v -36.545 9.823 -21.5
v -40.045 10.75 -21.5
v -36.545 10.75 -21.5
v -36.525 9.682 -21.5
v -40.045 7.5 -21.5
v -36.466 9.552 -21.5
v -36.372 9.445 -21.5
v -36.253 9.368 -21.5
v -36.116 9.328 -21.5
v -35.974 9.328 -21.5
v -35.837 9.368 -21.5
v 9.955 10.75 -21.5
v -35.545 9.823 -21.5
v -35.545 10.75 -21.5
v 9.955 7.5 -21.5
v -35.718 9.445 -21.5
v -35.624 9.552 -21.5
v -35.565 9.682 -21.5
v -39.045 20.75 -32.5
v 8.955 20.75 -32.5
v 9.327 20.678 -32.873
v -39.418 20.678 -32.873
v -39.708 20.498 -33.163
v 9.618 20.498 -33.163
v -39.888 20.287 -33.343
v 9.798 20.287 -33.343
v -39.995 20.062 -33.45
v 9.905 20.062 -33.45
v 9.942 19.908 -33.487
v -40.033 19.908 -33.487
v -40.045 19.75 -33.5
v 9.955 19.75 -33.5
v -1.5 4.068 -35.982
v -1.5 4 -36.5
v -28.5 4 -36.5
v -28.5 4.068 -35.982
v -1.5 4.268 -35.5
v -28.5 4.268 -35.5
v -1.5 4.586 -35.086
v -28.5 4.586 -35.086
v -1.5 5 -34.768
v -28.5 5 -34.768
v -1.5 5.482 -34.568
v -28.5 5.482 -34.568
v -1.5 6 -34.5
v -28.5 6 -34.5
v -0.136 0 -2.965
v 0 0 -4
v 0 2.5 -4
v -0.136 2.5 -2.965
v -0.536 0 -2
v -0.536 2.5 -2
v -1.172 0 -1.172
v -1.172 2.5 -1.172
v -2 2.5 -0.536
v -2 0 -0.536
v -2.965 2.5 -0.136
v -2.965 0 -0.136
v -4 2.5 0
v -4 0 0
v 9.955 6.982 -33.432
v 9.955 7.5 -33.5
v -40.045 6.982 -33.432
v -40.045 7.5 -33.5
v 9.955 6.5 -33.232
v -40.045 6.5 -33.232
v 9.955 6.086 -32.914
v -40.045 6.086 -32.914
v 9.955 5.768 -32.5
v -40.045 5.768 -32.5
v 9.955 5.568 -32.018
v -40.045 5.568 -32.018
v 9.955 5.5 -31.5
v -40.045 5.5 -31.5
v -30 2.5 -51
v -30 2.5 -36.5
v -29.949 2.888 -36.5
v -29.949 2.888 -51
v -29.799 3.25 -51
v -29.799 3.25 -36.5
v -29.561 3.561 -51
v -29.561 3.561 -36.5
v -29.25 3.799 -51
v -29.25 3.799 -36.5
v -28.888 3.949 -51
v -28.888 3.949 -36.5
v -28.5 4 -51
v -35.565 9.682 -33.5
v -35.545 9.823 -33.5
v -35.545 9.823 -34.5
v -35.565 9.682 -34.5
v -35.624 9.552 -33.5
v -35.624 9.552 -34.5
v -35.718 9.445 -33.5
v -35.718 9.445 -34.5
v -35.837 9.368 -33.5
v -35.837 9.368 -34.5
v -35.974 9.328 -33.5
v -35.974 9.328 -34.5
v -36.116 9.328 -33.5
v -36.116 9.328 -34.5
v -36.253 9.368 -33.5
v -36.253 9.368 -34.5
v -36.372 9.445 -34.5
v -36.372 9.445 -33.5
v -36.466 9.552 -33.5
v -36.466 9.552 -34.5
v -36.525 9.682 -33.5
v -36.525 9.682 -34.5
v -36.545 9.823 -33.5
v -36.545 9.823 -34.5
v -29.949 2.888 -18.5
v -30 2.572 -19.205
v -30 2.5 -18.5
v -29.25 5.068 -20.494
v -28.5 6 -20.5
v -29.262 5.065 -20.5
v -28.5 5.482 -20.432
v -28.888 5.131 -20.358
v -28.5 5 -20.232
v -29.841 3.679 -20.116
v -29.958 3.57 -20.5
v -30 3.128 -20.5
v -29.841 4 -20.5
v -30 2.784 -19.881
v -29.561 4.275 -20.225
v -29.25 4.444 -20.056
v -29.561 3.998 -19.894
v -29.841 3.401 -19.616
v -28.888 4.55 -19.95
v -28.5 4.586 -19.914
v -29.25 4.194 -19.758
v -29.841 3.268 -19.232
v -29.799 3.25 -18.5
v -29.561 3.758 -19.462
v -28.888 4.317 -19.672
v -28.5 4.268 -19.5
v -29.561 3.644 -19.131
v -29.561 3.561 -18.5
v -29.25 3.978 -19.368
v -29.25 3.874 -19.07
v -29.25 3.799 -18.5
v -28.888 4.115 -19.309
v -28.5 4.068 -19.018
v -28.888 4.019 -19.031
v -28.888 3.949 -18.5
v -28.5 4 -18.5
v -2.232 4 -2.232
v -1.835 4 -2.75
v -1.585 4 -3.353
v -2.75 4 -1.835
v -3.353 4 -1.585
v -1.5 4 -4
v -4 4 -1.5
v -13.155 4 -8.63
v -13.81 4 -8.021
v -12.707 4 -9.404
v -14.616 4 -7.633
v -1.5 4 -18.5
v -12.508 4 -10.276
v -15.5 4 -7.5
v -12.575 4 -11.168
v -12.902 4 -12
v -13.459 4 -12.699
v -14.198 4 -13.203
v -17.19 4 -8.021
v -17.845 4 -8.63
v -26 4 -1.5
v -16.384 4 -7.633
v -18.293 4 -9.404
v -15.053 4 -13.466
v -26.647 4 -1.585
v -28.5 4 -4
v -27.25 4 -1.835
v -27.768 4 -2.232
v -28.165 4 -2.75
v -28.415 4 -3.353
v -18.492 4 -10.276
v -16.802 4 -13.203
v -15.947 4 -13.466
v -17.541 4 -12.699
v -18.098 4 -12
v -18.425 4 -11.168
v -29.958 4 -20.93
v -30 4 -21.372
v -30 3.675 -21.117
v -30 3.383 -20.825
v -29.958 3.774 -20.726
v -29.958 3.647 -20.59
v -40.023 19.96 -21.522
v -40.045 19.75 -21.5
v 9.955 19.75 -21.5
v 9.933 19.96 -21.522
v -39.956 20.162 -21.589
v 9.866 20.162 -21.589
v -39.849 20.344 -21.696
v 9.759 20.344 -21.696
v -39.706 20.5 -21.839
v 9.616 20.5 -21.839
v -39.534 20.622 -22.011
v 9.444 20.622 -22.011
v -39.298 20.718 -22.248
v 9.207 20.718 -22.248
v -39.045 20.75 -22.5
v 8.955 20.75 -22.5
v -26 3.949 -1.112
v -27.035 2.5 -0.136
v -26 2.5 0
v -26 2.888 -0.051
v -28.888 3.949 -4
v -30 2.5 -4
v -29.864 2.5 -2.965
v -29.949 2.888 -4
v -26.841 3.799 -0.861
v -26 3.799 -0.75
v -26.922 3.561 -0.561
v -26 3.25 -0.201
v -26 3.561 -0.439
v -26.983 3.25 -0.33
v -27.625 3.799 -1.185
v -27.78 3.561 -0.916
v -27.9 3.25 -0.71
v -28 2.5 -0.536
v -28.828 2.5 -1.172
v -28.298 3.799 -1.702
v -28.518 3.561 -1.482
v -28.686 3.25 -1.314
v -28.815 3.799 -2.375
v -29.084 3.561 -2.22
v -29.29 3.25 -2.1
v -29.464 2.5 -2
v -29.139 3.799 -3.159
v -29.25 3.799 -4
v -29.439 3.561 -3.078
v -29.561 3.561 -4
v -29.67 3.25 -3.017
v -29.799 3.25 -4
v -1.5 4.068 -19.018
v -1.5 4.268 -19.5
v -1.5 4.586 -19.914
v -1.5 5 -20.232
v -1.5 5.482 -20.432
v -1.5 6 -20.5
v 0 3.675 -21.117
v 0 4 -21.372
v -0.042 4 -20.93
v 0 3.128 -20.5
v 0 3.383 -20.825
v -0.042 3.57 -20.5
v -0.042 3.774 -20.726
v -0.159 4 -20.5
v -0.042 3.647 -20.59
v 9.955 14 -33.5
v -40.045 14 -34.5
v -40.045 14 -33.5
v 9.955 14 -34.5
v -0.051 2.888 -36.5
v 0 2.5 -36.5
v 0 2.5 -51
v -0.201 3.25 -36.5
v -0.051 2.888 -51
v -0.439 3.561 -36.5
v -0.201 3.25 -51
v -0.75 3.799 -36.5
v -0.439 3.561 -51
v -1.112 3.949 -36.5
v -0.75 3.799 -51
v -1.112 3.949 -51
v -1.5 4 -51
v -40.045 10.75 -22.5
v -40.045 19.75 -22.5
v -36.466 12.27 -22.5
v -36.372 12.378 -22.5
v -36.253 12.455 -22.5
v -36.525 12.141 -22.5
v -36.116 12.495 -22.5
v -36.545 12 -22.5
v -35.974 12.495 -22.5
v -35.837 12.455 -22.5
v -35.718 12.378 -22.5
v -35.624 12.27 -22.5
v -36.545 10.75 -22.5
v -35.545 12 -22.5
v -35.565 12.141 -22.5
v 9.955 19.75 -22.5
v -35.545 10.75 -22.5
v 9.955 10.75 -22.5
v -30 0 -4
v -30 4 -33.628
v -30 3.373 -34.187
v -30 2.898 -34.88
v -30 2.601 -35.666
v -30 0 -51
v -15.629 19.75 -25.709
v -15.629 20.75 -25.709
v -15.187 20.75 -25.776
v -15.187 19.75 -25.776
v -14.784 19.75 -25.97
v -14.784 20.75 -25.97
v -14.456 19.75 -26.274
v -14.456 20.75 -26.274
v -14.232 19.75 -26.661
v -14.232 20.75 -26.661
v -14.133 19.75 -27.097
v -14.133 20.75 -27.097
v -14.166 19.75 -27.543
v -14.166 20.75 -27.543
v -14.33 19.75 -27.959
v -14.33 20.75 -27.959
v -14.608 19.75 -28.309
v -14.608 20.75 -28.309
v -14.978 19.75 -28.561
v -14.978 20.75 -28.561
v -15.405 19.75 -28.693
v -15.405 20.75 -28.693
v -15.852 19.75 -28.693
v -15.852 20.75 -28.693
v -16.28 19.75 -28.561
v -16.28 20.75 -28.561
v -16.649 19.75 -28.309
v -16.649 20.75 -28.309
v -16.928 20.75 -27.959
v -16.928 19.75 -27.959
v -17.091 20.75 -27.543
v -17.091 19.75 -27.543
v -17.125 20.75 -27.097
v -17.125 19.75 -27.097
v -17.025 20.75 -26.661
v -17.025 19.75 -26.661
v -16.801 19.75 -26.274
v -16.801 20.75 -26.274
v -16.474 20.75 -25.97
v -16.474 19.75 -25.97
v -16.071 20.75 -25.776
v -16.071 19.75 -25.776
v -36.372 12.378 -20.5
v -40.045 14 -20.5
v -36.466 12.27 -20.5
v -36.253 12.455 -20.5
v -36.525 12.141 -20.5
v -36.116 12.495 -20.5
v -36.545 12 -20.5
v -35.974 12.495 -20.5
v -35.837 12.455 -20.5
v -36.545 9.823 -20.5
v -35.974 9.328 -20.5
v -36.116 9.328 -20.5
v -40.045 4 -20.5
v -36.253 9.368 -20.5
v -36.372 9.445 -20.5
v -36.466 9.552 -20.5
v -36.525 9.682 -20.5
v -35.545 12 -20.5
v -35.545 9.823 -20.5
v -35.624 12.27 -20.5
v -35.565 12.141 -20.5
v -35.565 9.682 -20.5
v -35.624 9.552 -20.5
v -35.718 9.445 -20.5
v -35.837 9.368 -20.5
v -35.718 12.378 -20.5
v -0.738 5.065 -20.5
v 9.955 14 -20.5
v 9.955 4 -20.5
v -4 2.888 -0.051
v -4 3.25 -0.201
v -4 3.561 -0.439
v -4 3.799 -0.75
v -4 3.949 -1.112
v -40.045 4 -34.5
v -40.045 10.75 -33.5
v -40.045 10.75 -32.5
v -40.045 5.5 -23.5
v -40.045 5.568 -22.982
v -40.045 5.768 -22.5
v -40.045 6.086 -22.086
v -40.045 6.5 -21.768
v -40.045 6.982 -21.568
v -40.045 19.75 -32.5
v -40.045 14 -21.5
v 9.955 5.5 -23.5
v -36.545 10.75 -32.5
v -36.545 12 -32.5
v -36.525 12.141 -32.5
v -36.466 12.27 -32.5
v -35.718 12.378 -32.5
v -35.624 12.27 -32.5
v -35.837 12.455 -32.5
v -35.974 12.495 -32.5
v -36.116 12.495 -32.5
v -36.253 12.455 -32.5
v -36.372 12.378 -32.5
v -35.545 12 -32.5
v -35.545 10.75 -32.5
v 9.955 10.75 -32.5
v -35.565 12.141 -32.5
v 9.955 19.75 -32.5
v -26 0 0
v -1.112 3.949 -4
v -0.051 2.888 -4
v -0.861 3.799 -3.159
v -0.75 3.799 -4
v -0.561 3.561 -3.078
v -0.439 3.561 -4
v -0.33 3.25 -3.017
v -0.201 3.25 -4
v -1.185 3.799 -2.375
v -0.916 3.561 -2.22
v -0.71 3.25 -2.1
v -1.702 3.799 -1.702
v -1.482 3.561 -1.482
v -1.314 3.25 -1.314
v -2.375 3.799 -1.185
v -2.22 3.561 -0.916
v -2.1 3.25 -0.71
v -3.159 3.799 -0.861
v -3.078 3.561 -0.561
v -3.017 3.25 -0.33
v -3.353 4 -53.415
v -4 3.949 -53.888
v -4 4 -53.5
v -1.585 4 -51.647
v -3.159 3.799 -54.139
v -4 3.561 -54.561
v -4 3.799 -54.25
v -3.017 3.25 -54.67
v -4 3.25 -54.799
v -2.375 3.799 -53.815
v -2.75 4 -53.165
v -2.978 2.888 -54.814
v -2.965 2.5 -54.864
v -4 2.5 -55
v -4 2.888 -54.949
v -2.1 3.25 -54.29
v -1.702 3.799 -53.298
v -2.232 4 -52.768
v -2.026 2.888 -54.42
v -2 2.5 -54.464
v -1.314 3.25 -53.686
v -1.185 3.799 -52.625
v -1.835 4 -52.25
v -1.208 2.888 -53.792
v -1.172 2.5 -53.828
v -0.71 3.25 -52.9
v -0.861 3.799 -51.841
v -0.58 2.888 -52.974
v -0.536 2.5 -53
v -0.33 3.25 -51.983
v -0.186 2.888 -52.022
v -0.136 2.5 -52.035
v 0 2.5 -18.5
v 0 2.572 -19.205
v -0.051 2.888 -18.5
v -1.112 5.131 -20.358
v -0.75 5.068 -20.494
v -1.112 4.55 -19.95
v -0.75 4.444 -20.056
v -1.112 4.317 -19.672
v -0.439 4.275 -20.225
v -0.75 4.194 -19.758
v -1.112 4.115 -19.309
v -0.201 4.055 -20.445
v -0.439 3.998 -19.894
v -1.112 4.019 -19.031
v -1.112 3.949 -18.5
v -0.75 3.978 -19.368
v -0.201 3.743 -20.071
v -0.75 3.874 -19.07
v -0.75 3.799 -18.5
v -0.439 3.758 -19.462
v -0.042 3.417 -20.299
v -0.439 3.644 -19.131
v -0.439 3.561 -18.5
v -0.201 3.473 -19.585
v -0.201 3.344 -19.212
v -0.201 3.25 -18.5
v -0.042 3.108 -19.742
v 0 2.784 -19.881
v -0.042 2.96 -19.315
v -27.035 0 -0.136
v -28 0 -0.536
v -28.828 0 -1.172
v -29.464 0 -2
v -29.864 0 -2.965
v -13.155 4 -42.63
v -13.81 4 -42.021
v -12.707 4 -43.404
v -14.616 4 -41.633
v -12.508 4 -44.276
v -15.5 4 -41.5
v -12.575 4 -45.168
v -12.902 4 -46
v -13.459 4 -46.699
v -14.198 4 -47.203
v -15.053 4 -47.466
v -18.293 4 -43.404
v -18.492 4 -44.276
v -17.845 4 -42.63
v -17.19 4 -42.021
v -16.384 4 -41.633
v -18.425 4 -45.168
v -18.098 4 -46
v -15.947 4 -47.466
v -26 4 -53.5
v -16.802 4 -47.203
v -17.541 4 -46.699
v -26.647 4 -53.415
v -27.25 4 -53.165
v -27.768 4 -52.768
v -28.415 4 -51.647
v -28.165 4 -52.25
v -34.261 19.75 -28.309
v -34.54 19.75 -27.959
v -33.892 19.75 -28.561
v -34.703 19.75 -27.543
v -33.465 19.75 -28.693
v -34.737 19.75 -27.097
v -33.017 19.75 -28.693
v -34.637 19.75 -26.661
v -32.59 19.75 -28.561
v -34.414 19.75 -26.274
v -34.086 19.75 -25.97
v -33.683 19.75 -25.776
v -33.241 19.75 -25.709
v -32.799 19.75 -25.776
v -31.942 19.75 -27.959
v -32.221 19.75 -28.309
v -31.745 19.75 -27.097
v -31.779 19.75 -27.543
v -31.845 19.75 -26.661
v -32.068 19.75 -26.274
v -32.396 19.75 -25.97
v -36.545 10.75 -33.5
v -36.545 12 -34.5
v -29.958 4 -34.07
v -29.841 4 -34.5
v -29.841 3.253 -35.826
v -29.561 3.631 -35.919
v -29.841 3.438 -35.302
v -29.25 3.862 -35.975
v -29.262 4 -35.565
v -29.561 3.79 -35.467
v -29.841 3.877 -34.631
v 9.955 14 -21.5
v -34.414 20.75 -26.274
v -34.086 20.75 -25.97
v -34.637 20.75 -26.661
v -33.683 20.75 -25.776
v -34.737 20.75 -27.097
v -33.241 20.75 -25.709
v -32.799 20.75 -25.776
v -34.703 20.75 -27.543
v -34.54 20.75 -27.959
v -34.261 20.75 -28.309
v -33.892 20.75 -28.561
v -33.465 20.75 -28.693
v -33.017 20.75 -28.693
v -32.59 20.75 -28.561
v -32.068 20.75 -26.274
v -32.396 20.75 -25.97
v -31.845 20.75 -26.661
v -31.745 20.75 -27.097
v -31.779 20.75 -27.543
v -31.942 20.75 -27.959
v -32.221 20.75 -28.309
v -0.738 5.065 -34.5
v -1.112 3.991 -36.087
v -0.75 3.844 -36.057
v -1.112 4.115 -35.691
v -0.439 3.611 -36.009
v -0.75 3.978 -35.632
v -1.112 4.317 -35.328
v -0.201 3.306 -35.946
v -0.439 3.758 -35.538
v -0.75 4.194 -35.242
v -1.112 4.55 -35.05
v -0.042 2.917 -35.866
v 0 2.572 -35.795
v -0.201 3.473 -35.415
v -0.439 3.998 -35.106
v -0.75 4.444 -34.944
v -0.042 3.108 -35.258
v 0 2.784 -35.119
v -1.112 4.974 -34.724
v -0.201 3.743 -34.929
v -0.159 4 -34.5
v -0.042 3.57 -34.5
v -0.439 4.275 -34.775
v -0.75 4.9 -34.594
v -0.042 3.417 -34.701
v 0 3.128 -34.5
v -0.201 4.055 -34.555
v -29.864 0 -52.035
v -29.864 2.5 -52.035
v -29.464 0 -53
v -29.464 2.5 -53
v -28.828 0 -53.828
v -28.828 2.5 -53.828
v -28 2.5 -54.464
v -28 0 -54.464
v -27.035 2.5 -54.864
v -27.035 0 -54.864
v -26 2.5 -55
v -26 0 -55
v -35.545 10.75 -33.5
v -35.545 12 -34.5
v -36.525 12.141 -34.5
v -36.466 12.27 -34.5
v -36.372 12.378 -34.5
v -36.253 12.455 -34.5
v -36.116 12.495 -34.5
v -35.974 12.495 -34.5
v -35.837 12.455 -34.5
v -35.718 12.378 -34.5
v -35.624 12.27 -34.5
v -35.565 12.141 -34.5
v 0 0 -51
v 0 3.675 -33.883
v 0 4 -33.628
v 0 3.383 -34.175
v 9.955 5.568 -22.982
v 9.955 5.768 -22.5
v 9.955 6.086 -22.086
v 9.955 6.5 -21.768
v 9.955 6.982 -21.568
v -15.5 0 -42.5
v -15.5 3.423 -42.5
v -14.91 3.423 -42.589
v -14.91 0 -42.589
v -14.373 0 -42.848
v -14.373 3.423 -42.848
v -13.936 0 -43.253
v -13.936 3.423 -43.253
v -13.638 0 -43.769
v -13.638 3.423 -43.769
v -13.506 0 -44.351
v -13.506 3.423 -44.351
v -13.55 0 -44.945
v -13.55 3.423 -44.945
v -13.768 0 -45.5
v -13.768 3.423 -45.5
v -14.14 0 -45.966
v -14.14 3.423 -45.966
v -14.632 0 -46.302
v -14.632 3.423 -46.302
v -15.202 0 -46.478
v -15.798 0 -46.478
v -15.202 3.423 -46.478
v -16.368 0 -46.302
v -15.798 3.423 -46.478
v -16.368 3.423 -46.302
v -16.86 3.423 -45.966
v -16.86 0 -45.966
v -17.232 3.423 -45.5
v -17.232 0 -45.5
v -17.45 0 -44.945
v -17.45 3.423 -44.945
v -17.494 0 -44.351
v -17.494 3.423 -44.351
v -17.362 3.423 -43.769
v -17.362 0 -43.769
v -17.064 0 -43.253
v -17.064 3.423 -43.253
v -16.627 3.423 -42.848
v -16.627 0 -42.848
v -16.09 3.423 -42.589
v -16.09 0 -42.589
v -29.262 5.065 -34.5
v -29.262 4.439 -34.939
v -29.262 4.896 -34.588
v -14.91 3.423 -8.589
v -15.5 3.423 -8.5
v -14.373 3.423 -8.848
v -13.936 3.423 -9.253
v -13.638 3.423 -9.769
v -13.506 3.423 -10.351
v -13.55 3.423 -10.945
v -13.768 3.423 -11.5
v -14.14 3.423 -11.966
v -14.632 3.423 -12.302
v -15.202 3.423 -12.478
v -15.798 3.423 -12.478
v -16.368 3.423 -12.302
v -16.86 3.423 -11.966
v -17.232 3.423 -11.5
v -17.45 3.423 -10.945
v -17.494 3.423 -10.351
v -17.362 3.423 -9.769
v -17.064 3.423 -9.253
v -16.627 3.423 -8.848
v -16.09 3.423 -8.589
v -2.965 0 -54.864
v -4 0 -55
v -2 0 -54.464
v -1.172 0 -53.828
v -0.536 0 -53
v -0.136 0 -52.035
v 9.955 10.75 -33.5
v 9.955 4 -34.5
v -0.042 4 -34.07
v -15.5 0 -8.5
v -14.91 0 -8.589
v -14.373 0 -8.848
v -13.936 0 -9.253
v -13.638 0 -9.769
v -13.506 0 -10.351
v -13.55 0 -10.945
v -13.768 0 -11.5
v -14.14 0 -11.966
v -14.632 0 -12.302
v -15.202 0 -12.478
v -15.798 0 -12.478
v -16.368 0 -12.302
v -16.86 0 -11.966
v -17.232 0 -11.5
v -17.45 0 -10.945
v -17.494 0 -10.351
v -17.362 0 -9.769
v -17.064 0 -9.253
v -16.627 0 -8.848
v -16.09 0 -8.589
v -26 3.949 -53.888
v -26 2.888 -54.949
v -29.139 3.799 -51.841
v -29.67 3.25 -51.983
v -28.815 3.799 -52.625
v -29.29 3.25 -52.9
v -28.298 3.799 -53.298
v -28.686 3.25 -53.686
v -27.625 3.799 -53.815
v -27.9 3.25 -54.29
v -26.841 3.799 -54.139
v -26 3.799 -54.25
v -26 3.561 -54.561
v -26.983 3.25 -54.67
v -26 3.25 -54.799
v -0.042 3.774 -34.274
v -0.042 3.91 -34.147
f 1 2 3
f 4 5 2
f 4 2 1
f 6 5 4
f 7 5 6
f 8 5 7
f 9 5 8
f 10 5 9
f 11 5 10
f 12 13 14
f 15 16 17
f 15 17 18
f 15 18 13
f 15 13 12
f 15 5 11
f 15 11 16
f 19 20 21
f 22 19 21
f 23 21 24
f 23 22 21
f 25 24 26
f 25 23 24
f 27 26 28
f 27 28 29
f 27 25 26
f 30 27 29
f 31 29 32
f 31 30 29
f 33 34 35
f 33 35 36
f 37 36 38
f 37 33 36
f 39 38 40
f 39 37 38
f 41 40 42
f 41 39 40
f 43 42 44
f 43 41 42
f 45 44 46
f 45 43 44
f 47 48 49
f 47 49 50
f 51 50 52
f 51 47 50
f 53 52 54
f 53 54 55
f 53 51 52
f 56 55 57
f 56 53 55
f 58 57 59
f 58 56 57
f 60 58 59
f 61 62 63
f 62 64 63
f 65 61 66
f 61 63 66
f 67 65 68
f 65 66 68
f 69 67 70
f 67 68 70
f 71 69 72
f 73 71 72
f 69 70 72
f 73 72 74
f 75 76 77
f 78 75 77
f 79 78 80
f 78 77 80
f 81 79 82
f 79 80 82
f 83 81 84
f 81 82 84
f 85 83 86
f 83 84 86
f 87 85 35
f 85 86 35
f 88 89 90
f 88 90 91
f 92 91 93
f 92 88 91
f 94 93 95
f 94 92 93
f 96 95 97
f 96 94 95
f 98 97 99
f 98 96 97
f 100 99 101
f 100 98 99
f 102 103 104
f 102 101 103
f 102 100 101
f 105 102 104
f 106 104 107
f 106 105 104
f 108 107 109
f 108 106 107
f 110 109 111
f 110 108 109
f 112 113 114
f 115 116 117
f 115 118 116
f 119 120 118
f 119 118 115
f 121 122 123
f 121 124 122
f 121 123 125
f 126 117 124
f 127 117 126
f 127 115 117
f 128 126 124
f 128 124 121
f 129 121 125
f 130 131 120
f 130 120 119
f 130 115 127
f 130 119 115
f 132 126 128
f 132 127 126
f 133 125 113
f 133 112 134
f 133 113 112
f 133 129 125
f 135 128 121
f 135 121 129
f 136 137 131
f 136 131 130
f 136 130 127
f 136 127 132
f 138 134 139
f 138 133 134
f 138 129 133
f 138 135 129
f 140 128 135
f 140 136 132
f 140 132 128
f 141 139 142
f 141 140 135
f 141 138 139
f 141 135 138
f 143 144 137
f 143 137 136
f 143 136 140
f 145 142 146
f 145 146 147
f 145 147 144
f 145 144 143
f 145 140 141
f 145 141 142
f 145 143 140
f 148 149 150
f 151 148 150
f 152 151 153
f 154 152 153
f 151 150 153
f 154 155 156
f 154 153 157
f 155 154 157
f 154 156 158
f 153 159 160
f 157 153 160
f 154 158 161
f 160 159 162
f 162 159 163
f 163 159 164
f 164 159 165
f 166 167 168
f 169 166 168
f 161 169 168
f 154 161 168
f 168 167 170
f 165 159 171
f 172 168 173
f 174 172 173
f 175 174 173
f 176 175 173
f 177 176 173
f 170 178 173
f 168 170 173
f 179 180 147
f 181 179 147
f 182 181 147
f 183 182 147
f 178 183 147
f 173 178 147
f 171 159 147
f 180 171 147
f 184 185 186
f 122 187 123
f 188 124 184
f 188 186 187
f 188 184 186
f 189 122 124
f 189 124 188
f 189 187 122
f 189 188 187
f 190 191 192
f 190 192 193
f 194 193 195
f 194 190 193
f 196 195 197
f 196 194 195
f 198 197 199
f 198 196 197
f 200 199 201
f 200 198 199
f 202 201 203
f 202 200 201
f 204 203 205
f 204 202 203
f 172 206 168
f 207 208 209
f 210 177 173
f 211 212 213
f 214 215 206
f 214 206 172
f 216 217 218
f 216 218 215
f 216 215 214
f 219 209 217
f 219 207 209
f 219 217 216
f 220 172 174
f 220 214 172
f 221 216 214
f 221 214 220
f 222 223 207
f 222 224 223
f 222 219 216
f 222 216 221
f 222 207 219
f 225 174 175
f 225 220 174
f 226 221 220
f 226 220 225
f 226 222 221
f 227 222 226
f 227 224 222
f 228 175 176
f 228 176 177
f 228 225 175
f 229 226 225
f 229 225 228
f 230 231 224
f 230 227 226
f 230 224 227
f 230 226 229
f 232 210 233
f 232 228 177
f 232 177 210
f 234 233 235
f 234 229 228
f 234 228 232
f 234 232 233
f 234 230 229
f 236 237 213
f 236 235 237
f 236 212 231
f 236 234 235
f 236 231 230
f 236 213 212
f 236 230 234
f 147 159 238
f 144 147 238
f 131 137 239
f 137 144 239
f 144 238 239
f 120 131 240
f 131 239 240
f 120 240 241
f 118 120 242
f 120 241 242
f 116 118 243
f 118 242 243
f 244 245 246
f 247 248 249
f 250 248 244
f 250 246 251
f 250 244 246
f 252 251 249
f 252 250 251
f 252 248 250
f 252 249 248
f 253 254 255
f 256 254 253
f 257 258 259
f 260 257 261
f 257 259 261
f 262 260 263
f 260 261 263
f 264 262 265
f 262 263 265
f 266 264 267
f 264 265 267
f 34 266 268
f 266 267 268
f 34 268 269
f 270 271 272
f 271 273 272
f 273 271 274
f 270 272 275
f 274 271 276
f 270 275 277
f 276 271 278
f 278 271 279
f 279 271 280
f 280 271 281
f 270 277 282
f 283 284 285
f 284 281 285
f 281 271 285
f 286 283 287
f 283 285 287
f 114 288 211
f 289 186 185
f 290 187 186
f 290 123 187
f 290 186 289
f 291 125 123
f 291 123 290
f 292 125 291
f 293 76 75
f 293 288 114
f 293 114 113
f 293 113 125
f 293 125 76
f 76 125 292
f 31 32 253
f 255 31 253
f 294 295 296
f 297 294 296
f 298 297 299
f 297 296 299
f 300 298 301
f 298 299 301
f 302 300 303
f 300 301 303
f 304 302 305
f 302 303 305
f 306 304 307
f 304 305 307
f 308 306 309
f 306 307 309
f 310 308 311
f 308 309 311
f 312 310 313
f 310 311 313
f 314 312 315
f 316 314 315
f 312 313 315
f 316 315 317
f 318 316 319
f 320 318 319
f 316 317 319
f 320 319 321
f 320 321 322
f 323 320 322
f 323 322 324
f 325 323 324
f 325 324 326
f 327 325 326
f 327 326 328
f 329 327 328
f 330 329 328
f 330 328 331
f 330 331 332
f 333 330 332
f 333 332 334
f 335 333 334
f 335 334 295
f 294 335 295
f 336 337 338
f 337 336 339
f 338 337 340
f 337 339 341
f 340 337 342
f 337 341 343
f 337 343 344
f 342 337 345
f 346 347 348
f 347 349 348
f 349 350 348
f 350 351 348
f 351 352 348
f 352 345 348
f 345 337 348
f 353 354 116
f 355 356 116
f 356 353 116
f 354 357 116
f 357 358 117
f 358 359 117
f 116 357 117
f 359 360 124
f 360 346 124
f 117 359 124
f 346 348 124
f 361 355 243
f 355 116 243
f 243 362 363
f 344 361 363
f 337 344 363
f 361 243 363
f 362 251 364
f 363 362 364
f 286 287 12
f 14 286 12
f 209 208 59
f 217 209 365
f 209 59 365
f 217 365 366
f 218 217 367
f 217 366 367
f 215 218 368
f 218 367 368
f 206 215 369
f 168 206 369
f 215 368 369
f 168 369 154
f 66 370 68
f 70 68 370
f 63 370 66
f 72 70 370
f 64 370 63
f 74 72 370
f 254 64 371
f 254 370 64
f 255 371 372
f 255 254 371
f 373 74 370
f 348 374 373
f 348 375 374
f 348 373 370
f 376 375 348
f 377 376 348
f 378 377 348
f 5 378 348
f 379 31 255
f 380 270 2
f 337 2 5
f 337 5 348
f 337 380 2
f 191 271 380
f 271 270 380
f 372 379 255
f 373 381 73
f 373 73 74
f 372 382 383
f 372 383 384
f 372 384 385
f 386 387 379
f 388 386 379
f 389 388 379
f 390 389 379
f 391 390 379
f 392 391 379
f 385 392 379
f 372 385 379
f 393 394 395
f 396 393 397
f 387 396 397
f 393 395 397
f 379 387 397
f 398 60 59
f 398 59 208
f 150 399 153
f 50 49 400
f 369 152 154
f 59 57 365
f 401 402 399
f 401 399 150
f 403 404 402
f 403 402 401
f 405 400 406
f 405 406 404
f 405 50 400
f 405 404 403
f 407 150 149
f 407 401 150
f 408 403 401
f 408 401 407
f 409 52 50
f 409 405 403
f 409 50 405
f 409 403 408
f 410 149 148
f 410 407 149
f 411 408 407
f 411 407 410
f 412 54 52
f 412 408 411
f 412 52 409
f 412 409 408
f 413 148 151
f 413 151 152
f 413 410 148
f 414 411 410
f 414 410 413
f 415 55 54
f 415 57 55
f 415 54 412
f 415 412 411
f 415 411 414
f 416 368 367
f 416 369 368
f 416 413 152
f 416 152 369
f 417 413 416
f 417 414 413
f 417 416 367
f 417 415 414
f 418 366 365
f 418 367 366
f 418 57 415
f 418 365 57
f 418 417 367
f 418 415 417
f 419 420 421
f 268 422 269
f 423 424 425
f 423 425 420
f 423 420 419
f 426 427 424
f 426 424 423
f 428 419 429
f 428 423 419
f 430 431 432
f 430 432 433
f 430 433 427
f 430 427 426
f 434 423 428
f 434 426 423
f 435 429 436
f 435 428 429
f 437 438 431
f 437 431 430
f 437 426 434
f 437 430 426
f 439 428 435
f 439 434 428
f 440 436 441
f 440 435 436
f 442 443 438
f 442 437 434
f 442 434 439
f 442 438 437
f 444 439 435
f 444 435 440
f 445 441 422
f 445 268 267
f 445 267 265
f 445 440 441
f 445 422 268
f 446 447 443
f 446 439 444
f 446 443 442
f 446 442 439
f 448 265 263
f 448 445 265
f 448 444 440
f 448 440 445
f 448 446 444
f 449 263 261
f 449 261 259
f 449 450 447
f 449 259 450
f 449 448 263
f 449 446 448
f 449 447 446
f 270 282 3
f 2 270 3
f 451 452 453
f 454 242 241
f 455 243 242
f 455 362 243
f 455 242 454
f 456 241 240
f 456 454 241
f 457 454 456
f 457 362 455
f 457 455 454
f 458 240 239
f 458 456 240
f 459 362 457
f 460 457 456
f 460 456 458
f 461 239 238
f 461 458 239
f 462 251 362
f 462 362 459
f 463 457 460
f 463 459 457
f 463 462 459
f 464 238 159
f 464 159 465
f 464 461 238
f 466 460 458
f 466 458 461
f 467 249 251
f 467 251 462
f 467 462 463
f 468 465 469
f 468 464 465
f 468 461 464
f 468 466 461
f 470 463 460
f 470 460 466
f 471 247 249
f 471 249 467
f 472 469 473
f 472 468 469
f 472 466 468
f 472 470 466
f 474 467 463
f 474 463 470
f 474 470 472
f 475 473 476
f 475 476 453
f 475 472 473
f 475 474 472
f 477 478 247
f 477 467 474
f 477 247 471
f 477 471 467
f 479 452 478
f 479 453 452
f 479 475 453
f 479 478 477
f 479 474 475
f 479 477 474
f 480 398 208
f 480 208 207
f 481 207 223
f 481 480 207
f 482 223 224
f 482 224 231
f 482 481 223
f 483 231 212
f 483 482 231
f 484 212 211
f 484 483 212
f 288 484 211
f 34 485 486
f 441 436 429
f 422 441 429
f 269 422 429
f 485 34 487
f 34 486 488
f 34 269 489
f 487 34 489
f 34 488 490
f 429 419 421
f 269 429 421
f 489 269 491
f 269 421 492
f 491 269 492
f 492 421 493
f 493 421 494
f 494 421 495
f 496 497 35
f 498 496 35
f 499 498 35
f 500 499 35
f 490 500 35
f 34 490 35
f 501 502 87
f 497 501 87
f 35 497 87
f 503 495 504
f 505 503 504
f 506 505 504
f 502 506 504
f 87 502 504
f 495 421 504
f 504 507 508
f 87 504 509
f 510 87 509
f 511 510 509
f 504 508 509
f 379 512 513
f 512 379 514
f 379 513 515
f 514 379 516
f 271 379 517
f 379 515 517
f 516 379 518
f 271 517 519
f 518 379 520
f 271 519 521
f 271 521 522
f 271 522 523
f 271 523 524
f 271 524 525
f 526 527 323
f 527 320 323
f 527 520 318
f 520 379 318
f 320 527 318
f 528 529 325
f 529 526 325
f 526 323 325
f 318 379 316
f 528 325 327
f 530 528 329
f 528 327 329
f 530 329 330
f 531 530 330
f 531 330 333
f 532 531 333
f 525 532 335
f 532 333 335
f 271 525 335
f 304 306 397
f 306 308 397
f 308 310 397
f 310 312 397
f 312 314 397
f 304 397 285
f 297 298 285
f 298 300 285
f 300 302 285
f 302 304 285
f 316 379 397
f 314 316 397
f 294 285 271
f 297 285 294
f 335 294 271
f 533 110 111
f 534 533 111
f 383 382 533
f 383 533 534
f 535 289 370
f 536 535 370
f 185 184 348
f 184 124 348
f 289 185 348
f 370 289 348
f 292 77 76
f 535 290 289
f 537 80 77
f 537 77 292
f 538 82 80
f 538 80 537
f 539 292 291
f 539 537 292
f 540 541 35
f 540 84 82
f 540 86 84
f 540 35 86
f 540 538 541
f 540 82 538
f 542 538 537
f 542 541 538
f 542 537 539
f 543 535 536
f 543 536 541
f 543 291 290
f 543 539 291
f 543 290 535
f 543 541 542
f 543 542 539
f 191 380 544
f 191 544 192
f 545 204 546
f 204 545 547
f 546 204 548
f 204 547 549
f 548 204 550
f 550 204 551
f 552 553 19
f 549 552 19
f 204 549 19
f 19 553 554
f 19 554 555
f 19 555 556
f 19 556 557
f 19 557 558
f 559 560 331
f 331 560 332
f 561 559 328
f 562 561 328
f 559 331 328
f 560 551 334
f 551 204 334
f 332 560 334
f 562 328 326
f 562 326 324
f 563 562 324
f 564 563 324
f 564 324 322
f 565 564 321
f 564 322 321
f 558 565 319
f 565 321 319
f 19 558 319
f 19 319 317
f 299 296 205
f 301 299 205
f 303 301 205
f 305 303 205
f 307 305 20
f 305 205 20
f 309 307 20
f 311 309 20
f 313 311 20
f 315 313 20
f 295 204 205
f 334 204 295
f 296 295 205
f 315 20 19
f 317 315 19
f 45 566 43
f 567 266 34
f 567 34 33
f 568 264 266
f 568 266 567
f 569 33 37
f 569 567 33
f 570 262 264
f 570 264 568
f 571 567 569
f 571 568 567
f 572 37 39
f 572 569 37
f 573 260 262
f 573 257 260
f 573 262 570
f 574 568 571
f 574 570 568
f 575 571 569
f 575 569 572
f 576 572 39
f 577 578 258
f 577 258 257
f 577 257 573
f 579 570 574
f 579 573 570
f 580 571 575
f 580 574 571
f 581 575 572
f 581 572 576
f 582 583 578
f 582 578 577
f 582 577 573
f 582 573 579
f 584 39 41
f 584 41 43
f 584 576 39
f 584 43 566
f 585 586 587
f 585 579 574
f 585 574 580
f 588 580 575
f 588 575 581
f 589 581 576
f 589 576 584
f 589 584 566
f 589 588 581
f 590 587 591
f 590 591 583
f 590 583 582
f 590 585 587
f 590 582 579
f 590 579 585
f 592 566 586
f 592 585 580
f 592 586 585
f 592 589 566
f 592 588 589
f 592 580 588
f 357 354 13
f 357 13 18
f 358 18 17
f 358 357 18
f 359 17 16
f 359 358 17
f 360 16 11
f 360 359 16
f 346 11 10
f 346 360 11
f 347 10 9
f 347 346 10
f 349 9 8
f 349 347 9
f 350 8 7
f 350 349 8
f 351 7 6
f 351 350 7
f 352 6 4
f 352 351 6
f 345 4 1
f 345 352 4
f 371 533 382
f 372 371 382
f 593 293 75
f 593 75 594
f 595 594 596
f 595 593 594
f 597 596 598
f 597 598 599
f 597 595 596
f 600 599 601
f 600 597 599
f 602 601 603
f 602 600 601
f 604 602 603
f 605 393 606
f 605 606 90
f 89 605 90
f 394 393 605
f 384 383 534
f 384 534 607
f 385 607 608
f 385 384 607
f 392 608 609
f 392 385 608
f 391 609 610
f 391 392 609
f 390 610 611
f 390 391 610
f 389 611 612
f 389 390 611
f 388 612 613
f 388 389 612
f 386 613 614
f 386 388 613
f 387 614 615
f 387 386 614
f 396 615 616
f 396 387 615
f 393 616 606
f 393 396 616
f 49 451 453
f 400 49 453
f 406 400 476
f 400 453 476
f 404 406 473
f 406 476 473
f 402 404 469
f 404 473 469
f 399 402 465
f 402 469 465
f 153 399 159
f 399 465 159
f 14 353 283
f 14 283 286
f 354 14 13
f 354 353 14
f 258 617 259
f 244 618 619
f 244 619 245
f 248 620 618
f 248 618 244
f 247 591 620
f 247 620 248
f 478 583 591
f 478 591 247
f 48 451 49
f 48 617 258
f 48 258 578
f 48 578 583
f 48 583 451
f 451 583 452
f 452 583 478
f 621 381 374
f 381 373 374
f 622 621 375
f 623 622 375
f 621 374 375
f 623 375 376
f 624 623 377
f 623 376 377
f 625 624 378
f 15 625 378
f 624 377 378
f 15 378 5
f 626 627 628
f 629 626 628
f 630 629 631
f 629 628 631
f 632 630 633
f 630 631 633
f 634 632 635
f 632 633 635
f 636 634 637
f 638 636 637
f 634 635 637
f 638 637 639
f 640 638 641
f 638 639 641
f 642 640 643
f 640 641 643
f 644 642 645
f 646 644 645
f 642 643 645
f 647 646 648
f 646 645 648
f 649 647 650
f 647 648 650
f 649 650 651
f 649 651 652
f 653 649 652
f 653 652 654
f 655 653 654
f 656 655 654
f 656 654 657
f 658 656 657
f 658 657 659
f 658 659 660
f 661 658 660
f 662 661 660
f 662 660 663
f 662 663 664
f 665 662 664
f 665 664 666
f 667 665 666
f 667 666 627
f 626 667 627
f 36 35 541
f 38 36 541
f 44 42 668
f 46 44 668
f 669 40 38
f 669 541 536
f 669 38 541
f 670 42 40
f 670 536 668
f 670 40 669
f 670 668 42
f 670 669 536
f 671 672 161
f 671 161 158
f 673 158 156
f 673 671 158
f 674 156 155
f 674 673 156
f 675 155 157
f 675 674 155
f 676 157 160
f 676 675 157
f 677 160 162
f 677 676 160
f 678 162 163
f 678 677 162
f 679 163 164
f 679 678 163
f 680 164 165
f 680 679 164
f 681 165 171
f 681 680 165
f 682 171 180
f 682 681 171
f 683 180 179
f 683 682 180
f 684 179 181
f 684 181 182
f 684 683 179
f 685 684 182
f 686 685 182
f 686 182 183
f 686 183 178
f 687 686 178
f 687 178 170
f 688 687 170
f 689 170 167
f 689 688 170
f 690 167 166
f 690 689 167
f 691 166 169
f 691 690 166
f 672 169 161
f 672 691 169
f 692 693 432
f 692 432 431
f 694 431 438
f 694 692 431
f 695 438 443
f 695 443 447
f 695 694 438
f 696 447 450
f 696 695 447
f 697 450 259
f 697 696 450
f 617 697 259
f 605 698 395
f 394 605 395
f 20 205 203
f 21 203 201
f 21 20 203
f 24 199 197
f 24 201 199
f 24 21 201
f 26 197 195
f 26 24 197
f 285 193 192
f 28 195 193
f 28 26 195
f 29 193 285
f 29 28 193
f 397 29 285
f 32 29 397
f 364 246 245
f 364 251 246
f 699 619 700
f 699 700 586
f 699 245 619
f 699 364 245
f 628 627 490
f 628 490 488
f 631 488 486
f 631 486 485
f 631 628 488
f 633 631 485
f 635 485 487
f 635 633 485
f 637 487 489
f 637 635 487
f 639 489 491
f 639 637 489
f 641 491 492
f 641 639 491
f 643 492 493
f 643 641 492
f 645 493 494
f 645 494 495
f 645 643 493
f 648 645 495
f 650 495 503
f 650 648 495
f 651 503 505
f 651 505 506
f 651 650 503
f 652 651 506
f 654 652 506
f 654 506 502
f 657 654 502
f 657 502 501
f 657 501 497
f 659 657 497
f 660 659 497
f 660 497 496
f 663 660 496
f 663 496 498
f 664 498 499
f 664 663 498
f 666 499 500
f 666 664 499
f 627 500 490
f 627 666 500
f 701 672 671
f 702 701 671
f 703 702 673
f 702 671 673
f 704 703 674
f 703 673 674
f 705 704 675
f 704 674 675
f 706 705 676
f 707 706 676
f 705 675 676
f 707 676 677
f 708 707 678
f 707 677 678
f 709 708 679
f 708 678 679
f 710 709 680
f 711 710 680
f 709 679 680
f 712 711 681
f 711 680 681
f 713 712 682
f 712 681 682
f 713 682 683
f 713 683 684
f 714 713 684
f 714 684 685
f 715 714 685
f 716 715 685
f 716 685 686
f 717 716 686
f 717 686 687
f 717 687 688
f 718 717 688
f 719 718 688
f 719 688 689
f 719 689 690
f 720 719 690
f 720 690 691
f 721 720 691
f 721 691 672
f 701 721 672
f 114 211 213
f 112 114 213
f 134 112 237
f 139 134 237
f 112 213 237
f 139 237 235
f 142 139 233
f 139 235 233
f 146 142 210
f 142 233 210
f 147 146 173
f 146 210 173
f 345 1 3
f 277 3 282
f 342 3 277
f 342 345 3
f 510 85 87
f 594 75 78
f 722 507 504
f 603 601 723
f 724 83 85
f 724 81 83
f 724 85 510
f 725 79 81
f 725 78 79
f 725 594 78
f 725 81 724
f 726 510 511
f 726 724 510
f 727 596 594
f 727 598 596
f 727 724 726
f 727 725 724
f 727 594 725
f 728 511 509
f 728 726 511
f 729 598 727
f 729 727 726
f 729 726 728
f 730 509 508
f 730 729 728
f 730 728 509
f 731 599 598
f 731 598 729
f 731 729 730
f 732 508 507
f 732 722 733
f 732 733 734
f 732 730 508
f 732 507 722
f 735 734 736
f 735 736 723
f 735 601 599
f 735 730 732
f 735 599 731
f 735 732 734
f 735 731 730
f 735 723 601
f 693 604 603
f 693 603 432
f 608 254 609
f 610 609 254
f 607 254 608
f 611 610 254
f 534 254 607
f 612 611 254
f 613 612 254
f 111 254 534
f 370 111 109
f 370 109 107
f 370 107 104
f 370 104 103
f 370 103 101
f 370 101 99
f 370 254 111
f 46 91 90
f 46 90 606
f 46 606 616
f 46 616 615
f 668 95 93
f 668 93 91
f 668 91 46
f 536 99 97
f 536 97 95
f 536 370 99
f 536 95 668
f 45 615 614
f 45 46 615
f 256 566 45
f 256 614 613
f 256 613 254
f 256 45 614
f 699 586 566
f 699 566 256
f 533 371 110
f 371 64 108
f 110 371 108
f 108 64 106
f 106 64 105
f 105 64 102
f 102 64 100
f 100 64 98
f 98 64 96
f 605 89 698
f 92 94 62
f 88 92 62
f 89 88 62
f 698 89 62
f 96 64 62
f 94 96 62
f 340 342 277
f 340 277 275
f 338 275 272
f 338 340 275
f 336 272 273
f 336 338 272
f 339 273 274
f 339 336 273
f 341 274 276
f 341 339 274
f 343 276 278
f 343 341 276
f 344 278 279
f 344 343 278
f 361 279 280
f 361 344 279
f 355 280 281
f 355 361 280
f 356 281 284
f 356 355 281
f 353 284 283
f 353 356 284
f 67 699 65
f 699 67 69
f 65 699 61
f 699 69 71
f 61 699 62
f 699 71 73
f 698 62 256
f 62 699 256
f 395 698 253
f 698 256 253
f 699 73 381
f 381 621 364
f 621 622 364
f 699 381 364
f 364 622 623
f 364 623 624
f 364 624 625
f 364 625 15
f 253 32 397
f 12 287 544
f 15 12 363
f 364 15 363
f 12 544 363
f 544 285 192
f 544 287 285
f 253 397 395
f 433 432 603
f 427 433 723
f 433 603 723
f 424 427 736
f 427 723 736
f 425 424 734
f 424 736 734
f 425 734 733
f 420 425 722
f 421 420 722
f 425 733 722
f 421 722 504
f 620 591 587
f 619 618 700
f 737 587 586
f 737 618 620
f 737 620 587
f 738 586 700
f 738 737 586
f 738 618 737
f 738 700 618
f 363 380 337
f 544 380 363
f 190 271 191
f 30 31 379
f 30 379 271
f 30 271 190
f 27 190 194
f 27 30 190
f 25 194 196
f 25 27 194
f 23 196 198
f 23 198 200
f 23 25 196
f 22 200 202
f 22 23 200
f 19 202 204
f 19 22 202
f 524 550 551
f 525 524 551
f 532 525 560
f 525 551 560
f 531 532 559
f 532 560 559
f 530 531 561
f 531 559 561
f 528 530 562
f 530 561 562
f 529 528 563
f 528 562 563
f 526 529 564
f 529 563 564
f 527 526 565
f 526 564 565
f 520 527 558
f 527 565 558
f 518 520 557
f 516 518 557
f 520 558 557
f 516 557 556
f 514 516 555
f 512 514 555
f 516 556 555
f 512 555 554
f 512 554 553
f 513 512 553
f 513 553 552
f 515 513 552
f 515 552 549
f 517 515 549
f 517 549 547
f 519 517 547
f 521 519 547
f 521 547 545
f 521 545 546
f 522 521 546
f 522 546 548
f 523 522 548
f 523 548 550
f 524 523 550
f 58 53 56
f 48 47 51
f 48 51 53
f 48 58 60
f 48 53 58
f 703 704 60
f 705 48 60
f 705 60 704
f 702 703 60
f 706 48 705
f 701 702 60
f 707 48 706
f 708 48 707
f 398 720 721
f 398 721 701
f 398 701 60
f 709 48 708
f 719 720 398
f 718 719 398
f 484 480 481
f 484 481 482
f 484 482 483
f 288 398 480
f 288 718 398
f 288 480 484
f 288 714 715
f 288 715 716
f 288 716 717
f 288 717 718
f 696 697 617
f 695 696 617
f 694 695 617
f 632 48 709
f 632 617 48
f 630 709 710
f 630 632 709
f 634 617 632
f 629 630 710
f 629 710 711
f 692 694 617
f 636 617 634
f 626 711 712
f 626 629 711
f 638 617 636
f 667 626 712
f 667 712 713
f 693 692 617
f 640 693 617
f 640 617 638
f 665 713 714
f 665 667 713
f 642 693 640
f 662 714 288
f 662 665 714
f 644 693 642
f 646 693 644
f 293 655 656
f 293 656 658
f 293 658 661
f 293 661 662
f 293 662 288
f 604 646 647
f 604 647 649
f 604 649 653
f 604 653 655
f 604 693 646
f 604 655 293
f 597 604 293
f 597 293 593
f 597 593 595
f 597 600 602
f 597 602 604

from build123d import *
from OCP.BRepFilletAPI import BRepFilletAPI_MakeChamfer

# Parameters (mm, degrees)
BOSS_EXTRUDE1_DEPTH = 4
SKETCH3_W           = 50
SKETCH3_H           = 1
BOSS_EXTRUDE2_DEPTH = 10
BOSS_EXTRUDE3_START = -13
SKETCH4_W           = 50
SKETCH4_H           = 1.5
BOSS_EXTRUDE3_DEPTH = 12
FILLET1_R           = 2
FILLET2_R           = 2
FILLET3_R           = 2
FILLET4_R           = 1.5
BOSS_EXTRUDE4_DEPTH = 50
FILLET6_START       = -40.045040573
FILLET6_DEPTH       = 50
FILLET6_START_2     = -34.5
FILLET6_2_DEPTH     = 14
SKETCH6_R           = 1.5
CUT_EXTRUDE1_DEPTH  = 2
SKETCH8_R           = 2
CUT_EXTRUDE2_DEPTH  = 10
CHAMFER1_SIZE       = 1
CHAMFER1_SIZE2      = 0.577350269
CUT_EXTRUDE3_DEPTH  = 57.783957087


with BuildPart() as part:
    # Sketch1 → Boss-Extrude1 (new body)
    with BuildSketch(Plane(origin=(0, 0, 0), x_dir=(1, 0, 0), z_dir=(0, 1, 0))):
        with BuildLine():
            Line((-4, 0), (-26, 0))
            ThreePointArc((-26, 0), (-28.828427125, 1.171572875), (-30, 4))
            Line((-30, 4), (-30, 51))
            ThreePointArc((-30, 51), (-28.828427125, 53.828427125), (-26, 55))
            Line((-26, 55), (-4, 55))
            ThreePointArc((-4, 55), (-1.171572875, 53.828427125), (0, 51))
            Line((0, 51), (0, 4))
            ThreePointArc((0, 4), (-1.171572875, 1.171572875), (-4, 0))
        make_face()
    extrude(amount=BOSS_EXTRUDE1_DEPTH)

    # Sketch3 → Boss-Extrude2 (add)
    with BuildSketch(Plane(origin=(0, 4, 0), x_dir=(1, 0, 0), z_dir=(0, 1, 0))):
        with Locations((-15.045040573, 21)):
            Rectangle(SKETCH3_W, SKETCH3_H)
        with Locations((-15.045040573, 34)):
            Rectangle(SKETCH3_W, SKETCH3_H)
    extrude(amount=BOSS_EXTRUDE2_DEPTH)

    # Sketch4 → Boss-Extrude3 (add)
    with BuildSketch(Plane(origin=(0, 0, -34.5), x_dir=(-1, 0, 0), z_dir=(0, 0, -1)).offset(BOSS_EXTRUDE3_START)):
        with Locations((15.045040573, 4.75)):
            Rectangle(SKETCH4_W, SKETCH4_H)
    extrude(amount=BOSS_EXTRUDE3_DEPTH)

    # Fillet1
    fillet1_edges = [part.edges().sort_by_distance(p)[0] for p in [
        (-15, 4, -20.5),
    ]]
    fillet(fillet1_edges, radius=FILLET1_R)

    # Fillet2
    fillet2_edges = [part.edges().sort_by_distance(p)[0] for p in [
        (-15, 4, -34.5),
    ]]
    fillet(fillet2_edges, radius=FILLET2_R)

    # Fillet3
    fillet3_edges = [part.edges().sort_by_distance(p)[0] for p in [
        (-15.045040573, 5.5, -33.5),
        (-15.045040573, 5.5, -21.5),
    ]]
    fillet(fillet3_edges, radius=FILLET3_R)

    # Fillet4
    # the kernel refuses this fillet: 1.5 mm, written as the material it takes off along each edge
    with BuildSketch(Plane(origin=(0, 6, -36.5), x_dir=(0, -1, 0), z_dir=(0, 0, -1))) as fillet4_piece_1_section:
        with BuildLine():
            CenterArc((2 + FILLET4_R, FILLET4_R), FILLET4_R, 180, 90)
            Line((2 + FILLET4_R, 0), (2, 0))
            Line((2, 0), (2, FILLET4_R))
        make_face()
    fillet4_piece_1 = revolve(axis=Axis((0, 6, -36.5), (-1, 0, 0)), revolution_arc=197.472741928, mode=Mode.PRIVATE)
    fillet4_piece_1 = split(fillet4_piece_1, bisect_by=Plane(origin=(0, 6, -34.5), z_dir=(0, 0, -1)), keep=Keep.TOP, mode=Mode.PRIVATE)
    add(fillet4_piece_1, mode=Mode.SUBTRACT)
    with BuildSketch(Plane(origin=(0, 6, -36.5), x_dir=(0, -1, 0), z_dir=(0, 0, -1))) as fillet4_piece_2_section:
        with BuildLine():
            CenterArc((2 + FILLET4_R, FILLET4_R), FILLET4_R, 180, 90)
            Line((2 + FILLET4_R, 0), (2, 0))
            Line((2, 0), (2, FILLET4_R))
        make_face()
    fillet4_piece_2 = revolve(axis=Axis((0, 6, -36.5), (-1, 0, 0)), revolution_arc=197.472741928, mode=Mode.PRIVATE)
    fillet4_piece_2 = split(fillet4_piece_2, bisect_by=Plane(origin=(0, 4, -36.5), z_dir=(0, -1, 0)), keep=Keep.TOP, mode=Mode.PRIVATE)
    add(fillet4_piece_2, mode=Mode.SUBTRACT)
    with BuildSketch(Plane(origin=(-30, 6, -36.5), x_dir=(0, -1, 0), z_dir=(0, 0, -1))) as fillet4_piece_3_section:
        with BuildLine():
            CenterArc((2 + FILLET4_R, -FILLET4_R), FILLET4_R, 90, 90)
            Line((2, -FILLET4_R), (2, 0))
            Line((2, 0), (2 + FILLET4_R, 0))
        make_face()
    fillet4_piece_3 = revolve(axis=Axis((-30, 6, -36.5), (-1, 0, 0)), revolution_arc=197.472741928, mode=Mode.PRIVATE)
    fillet4_piece_3 = split(fillet4_piece_3, bisect_by=Plane(origin=(-30, 4, -36.5), z_dir=(0, -1, 0)), keep=Keep.TOP, mode=Mode.PRIVATE)
    add(fillet4_piece_3, mode=Mode.SUBTRACT)
    with BuildSketch(Plane(origin=(-30, 6, -36.5), x_dir=(0, -1, 0), z_dir=(0, 0, -1))) as fillet4_piece_4_section:
        with BuildLine():
            CenterArc((2 + FILLET4_R, -FILLET4_R), FILLET4_R, 90, 90)
            Line((2, -FILLET4_R), (2, 0))
            Line((2, 0), (2 + FILLET4_R, 0))
        make_face()
    fillet4_piece_4 = revolve(axis=Axis((-30, 6, -36.5), (-1, 0, 0)), revolution_arc=197.472741928, mode=Mode.PRIVATE)
    fillet4_piece_4 = split(fillet4_piece_4, bisect_by=Plane(origin=(-30, 6, -34.5), z_dir=(0, 0, -1)), keep=Keep.TOP, mode=Mode.PRIVATE)
    add(fillet4_piece_4, mode=Mode.SUBTRACT)
    with BuildSketch(Plane(origin=(-30, 6, -18.5), x_dir=(0, 0.9538599015249878, 0.30025204122993193), z_dir=(0, -0.30025204122993193, 0.9538599015249878))) as fillet4_piece_5_section:
        with BuildLine():
            CenterArc((2 + FILLET4_R, -FILLET4_R), FILLET4_R, 90, 90)
            Line((2, -FILLET4_R), (2, 0))
            Line((2, 0), (2 + FILLET4_R, 0))
        make_face()
    fillet4_piece_5 = revolve(axis=Axis((-30, 6, -18.5), (-1, 0, 0)), revolution_arc=197.472741928, mode=Mode.PRIVATE)
    fillet4_piece_5 = split(fillet4_piece_5, bisect_by=Plane(origin=(-30, 6, -20.5), z_dir=(0, 0, 1)), keep=Keep.TOP, mode=Mode.PRIVATE)
    add(fillet4_piece_5, mode=Mode.SUBTRACT)
    with BuildSketch(Plane(origin=(-30, 6, -18.5), x_dir=(0, 0.9538599015249878, 0.30025204122993193), z_dir=(0, -0.30025204122993193, 0.9538599015249878))) as fillet4_piece_6_section:
        with BuildLine():
            CenterArc((2 + FILLET4_R, -FILLET4_R), FILLET4_R, 90, 90)
            Line((2, -FILLET4_R), (2, 0))
            Line((2, 0), (2 + FILLET4_R, 0))
        make_face()
    fillet4_piece_6 = revolve(axis=Axis((-30, 6, -18.5), (-1, 0, 0)), revolution_arc=197.472741928, mode=Mode.PRIVATE)
    fillet4_piece_6 = split(fillet4_piece_6, bisect_by=Plane(origin=(-30, 4, -18.5), z_dir=(0, -1, 0)), keep=Keep.TOP, mode=Mode.PRIVATE)
    add(fillet4_piece_6, mode=Mode.SUBTRACT)
    with BuildSketch(Plane(origin=(0, 6, -18.5), x_dir=(0, 0.9538599015249878, 0.3002520412299318), z_dir=(0, -0.3002520412299318, 0.9538599015249878))) as fillet4_piece_7_section:
        with BuildLine():
            CenterArc((2 + FILLET4_R, FILLET4_R), FILLET4_R, 180, 90)
            Line((2, FILLET4_R), (2, 0))
            Line((2, 0), (2 + FILLET4_R, 0))
        make_face()
    fillet4_piece_7 = revolve(axis=Axis((0, 6, -18.5), (-1, 0, 0)), revolution_arc=197.472741928, mode=Mode.PRIVATE)
    fillet4_piece_7 = split(fillet4_piece_7, bisect_by=Plane(origin=(0, 6, -20.5), z_dir=(0, 0, 1)), keep=Keep.TOP, mode=Mode.PRIVATE)
    add(fillet4_piece_7, mode=Mode.SUBTRACT)
    with BuildSketch(Plane(origin=(0, 6, -18.5), x_dir=(0, 0.9538599015249878, 0.3002520412299318), z_dir=(0, -0.3002520412299318, 0.9538599015249878))) as fillet4_piece_8_section:
        with BuildLine():
            CenterArc((2 + FILLET4_R, FILLET4_R), FILLET4_R, 180, 90)
            Line((2, FILLET4_R), (2, 0))
            Line((2, 0), (2 + FILLET4_R, 0))
        make_face()
    fillet4_piece_8 = revolve(axis=Axis((0, 6, -18.5), (-1, 0, 0)), revolution_arc=197.472741928, mode=Mode.PRIVATE)
    fillet4_piece_8 = split(fillet4_piece_8, bisect_by=Plane(origin=(0, 4, -18.5), z_dir=(0, -1, 0)), keep=Keep.TOP, mode=Mode.PRIVATE)
    add(fillet4_piece_8, mode=Mode.SUBTRACT)
    with BuildSketch(Plane(origin=(-26, 4, -51), x_dir=(-1, 0, 0), z_dir=(0, 0, 1))) as fillet4_piece_9:
        with BuildLine():
            CenterArc((4 - FILLET4_R, FILLET4_R), FILLET4_R, 270, 90)
            Line((4, FILLET4_R), (4, 0))
            Line((4, 0), (4 - FILLET4_R, 0))
        make_face()
    revolve(axis=Axis((-26, 4, -51), (0, -1, 0)), revolution_arc=90, mode=Mode.SUBTRACT)
    with BuildSketch(Plane(origin=(-26, 4, -55), x_dir=(0, 0, 1), z_dir=(1, 0, 0)), Plane(origin=(-4, 4, 0), x_dir=(0, 0, -1), z_dir=(-1, 0, 0))) as fillet4_piece_10:
        with BuildLine():
            CenterArc((FILLET4_R, FILLET4_R), FILLET4_R, 180, 90)
            Line((0, FILLET4_R), (0, 0))
            Line((0, 0), (FILLET4_R, 0))
        make_face()
    extrude(amount=22, mode=Mode.SUBTRACT)
    with BuildSketch(Plane(origin=(-4, 4, -51), x_dir=(0, 0, -1), z_dir=(-1, 0, 0))) as fillet4_piece_11:
        with BuildLine():
            CenterArc((4 - FILLET4_R, FILLET4_R), FILLET4_R, 270, 90)
            Line((4, FILLET4_R), (4, 0))
            Line((4, 0), (4 - FILLET4_R, 0))
        make_face()
    revolve(axis=Axis((-4, 4, -51), (0, -1, 0)), revolution_arc=90, mode=Mode.SUBTRACT)
    with BuildSketch(Plane(origin=(0, 4, -51), x_dir=(0, -1, 0), z_dir=(0, 0, 1)), Plane(origin=(-30, 4, -36.5), x_dir=(0, -1, 0), z_dir=(0, 0, -1)), Plane(origin=(-30, 4, -4), x_dir=(0, -1, 0), z_dir=(0, 0, -1)), Plane(origin=(0, 4, -18.5), x_dir=(0, -1, 0), z_dir=(0, 0, 1))) as fillet4_piece_12:
        with BuildLine():
            CenterArc((FILLET4_R, -FILLET4_R), FILLET4_R, 90, 90)
            Line((0, -FILLET4_R), (0, 0))
            Line((0, 0), (FILLET4_R, 0))
        make_face()
    extrude(amount=14.5, mode=Mode.SUBTRACT)
    with BuildSketch(Plane(origin=(-4, 4, -4), x_dir=(1, 0, 0), z_dir=(0, 0, -1))) as fillet4_piece_13:
        with BuildLine():
            CenterArc((4 - FILLET4_R, FILLET4_R), FILLET4_R, 270, 90)
            Line((4, FILLET4_R), (4, 0))
            Line((4, 0), (4 - FILLET4_R, 0))
        make_face()
    revolve(axis=Axis((-4, 4, -4), (0, -1, 0)), revolution_arc=90, mode=Mode.SUBTRACT)
    with BuildSketch(Plane(origin=(-26, 4, -4), x_dir=(0, 0, 1), z_dir=(1, 0, 0))) as fillet4_piece_14:
        with BuildLine():
            CenterArc((4 - FILLET4_R, FILLET4_R), FILLET4_R, 270, 90)
            Line((4 - FILLET4_R, 0), (4, 0))
            Line((4, 0), (4, FILLET4_R))
        make_face()
    revolve(axis=Axis((-26, 4, -4), (0, -1, 0)), revolution_arc=90, mode=Mode.SUBTRACT)

    # Sketch5 → Boss-Extrude4 (add)
    with BuildSketch(Plane(origin=(9.954959427, 0, 0), x_dir=(0, 0, -1), z_dir=(1, 0, 0))):
        Polygon((21.5, 10.75), (21.5, 20.75), (33.5, 20.75), (33.5, 10.75), (32.5, 10.75), (32.5, 19.75), (22.5, 19.75), (22.5, 10.75), align=None)
    extrude(amount=-BOSS_EXTRUDE4_DEPTH)

    # Fillet6: read off the stored shape, not the designer's step
    # Fillet6 outline → Fillet6 (cut)
    with BuildSketch(Plane.YZ.offset(FILLET6_START)):
        with BuildLine():
            ThreePointArc((19.75, -21.5), (20.457106781, -21.792893219), (20.75, -22.5))
            Line((20.75, -22.5), (20.75, -21.5))
            Line((20.75, -21.5), (19.75, -21.5))
        make_face()
        with BuildLine():
            ThreePointArc((20.75, -32.5), (20.457106781, -33.207106781), (19.75, -33.5))
            Line((19.75, -33.5), (20.75, -33.5))
            Line((20.75, -33.5), (20.75, -32.5))
        make_face()
    extrude(amount=FILLET6_DEPTH, mode=Mode.SUBTRACT)

    # Fillet6 2 outline → Fillet6 2 (cut)
    with BuildSketch(Plane.XY.offset(FILLET6_START_2)):
        with BuildLine():
            Line((-40.045040573, 20.75), (-40.045040573, 19.75))
            ThreePointArc((-40.045040573, 19.75), (-39.752147354, 20.457106781), (-39.045040573, 20.75))
            Line((-39.045040573, 20.75), (-40.045040573, 20.75))
        make_face()
        with BuildLine():
            Line((9.954959427, 20.75), (8.954959427, 20.75))
            ThreePointArc((8.954959427, 20.75), (9.662066208, 20.457106781), (9.954959427, 19.75))
            Line((9.954959427, 19.75), (9.954959427, 20.75))
        make_face()
    extrude(amount=FILLET6_2_DEPTH, mode=Mode.SUBTRACT)

    # Sketch6 → Cut-Extrude1 (cut)
    with BuildSketch(Plane(origin=(0, 20.75, 0), x_dir=(1, 0, 0), z_dir=(0, 1, 0))):
        with Locations(Location((-15.628742291, 27.209372309, 0), (0, 0, 270))):
            Circle(SKETCH6_R)
        with Locations(Location((-33.241009351, 27.209372309, 0), (0, 0, 270))):
            Circle(SKETCH6_R)
    extrude(amount=-CUT_EXTRUDE1_DEPTH, mode=Mode.SUBTRACT)

    # Sketch8 → Cut-Extrude2 (cut)
    with BuildSketch(Plane(origin=(0, 4, 0), x_dir=(1, 0, 0), z_dir=(0, 1, 0))):
        with Locations(Location((-15.5, 10.5, 0), (0, 0, 270))):
            Circle(SKETCH8_R)
        with Locations(Location((-15.5, 44.5, 0), (0, 0, 270))):
            Circle(SKETCH8_R)
    extrude(amount=-CUT_EXTRUDE2_DEPTH, mode=Mode.SUBTRACT)

    # Chamfer1: one chamfer whose edges measure the first distance from different faces: ONE call of the kernel's chamfer builder (chamfer() names one face for all edges)
    chamfer1_edges_1 = [part.edges().sort_by_distance(p)[0] for p in [
        (-15.5, 4, -12.5),
    ]]
    chamfer1_side_1 = [part.faces().sort_by_distance(p)[0] for p in [
        (-15, 4, -1.819061123),
    ]]
    chamfer1_edges_2 = [part.edges().sort_by_distance(p)[0] for p in [
        (-15.5, 4, -46.5),
    ]]
    chamfer1_side_2 = [part.faces().sort_by_distance(p)[0] for p in [
        (-15, 4, -36.819061123),
    ]]
    chamfer1 = BRepFilletAPI_MakeChamfer(part.part.solid().wrapped)
    for e in chamfer1_edges_1:
        chamfer1.Add(CHAMFER1_SIZE, CHAMFER1_SIZE2, e.wrapped, chamfer1_side_1[0].wrapped)  # the first distance lies on this face
    for e in chamfer1_edges_2:
        chamfer1.Add(CHAMFER1_SIZE, CHAMFER1_SIZE2, e.wrapped, chamfer1_side_2[0].wrapped)  # the first distance lies on this face
    add(Compound.cast(chamfer1.Shape()), mode=Mode.REPLACE)

    # Sketch9 → Cut-Extrude3 (cut, through all)
    with BuildSketch(Plane.XY.offset(-20.5)):
        with BuildLine():
            Line((-35.545040573, 12), (-35.545040573, 9.822550729))
            ThreePointArc((-35.545040573, 9.822550729), (-36.045040573, 9.322550729), (-36.545040573, 9.822550729))
            Line((-36.545040573, 9.822550729), (-36.545040573, 12))
            ThreePointArc((-36.545040573, 12), (-36.045040573, 12.5), (-35.545040573, 12))
        make_face()
    extrude(amount=-CUT_EXTRUDE3_DEPTH, mode=Mode.SUBTRACT)


solid = part.part
